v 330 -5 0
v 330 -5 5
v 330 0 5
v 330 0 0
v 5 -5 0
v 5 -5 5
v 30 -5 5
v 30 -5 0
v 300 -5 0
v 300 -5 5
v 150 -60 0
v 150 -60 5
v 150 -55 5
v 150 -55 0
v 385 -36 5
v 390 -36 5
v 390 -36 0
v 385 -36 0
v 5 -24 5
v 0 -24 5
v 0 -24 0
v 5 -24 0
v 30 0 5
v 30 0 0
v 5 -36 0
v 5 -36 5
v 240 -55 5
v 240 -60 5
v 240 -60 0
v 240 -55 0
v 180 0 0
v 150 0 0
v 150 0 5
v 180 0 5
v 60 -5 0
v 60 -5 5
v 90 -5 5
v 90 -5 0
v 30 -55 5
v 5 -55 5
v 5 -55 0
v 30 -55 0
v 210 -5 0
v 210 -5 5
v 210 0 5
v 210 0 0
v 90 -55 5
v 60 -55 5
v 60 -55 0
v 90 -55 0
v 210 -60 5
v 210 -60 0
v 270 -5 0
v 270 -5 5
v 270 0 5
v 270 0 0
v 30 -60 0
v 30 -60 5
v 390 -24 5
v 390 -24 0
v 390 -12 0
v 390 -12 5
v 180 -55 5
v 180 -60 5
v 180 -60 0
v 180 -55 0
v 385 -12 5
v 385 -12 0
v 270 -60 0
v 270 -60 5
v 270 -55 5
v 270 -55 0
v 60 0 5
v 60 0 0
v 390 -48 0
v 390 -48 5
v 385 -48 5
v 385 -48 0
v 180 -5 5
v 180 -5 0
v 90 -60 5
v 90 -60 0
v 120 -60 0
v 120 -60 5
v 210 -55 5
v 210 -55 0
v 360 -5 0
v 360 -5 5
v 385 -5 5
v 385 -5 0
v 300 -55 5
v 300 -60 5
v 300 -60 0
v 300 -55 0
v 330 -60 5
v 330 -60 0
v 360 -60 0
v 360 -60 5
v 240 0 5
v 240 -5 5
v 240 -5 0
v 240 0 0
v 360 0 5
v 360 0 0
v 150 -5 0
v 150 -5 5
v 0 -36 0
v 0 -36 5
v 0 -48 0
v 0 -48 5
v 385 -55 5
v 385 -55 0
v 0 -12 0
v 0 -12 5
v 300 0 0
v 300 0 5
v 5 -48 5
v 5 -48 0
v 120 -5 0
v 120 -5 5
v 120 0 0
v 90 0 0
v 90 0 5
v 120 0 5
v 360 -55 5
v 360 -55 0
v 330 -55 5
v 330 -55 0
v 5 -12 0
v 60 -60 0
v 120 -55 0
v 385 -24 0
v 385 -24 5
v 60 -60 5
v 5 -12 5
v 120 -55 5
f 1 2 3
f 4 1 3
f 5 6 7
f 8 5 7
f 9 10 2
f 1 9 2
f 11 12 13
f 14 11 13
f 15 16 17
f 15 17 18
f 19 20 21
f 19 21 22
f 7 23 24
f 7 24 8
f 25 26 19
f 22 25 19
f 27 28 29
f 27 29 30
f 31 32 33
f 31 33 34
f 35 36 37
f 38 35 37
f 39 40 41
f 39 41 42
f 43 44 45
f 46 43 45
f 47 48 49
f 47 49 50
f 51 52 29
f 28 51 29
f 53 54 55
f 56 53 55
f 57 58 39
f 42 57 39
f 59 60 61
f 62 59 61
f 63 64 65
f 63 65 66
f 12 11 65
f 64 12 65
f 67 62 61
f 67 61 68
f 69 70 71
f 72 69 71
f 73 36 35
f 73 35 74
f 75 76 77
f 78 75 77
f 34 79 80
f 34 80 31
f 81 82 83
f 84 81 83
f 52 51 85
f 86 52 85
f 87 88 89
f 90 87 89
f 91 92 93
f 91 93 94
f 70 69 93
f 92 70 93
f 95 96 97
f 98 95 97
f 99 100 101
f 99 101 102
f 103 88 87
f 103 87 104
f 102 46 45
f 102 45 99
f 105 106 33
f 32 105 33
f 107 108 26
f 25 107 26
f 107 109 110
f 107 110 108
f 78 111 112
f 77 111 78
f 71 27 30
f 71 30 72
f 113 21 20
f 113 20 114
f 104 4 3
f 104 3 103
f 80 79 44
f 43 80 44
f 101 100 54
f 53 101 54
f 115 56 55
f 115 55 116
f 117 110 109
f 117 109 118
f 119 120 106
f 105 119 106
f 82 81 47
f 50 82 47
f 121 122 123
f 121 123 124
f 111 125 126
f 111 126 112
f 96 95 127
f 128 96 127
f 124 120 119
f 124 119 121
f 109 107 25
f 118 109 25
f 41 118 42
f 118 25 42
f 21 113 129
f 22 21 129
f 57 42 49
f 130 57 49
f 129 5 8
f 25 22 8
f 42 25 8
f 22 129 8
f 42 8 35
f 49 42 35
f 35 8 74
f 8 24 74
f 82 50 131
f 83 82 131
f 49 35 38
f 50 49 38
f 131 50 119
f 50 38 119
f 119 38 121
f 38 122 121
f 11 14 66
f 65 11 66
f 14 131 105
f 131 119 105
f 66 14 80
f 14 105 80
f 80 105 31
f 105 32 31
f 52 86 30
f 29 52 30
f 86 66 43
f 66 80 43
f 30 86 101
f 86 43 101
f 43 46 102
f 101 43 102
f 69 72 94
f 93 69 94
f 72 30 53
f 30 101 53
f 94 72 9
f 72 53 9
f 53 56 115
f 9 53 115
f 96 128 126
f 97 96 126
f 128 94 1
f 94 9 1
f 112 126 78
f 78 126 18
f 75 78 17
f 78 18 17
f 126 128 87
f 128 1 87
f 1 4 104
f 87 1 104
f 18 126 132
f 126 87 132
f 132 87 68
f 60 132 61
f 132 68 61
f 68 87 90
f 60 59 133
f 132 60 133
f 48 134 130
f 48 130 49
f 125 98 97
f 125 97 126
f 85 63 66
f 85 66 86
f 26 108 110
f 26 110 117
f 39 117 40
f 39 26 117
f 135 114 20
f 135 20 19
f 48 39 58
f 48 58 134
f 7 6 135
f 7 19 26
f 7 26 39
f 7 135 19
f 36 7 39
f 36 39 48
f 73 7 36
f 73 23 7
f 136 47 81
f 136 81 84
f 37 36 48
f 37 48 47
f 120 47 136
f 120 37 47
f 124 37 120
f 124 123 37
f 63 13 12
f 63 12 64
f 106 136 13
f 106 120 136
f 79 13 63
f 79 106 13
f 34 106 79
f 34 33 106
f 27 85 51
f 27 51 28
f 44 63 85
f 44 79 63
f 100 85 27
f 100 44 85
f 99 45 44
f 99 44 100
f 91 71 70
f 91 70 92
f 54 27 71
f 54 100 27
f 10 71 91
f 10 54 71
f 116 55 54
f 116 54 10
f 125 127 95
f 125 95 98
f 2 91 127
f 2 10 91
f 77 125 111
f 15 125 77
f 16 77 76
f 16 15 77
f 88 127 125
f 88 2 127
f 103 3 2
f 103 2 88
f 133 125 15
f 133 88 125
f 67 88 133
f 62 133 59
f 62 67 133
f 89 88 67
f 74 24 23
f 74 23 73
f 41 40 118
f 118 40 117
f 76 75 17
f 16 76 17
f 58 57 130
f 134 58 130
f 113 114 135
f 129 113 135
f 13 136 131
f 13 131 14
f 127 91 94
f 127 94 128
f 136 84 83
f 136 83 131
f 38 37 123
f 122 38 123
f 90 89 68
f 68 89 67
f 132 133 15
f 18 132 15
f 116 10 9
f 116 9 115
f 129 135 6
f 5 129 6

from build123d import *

# Parameters (mm, degrees)
ESQUISSE1_W                = 390
ESQUISSE1_H                = 60
BOSS_EXTRU_1_DEPTH         = 5
ESQUISSE2_W                = 30
ESQUISSE2_H                = 5
ENL_V_MAT_EXTRU_1_DEPTH    = 5
R_P_TITION_LIN_AIRE1_COUNT = 7
R_P_TITION_LIN_AIRE1_PITCH = 60
ESQUISSE3_W                = 5
ESQUISSE3_H                = 12
ENL_V_MAT_EXTRU_2_DEPTH    = 5
R_P_TITION_LIN_AIRE2_COUNT = 3
R_P_TITION_LIN_AIRE2_PITCH = 24
SYM_TRIE1_COPY_1_SKETCH_W  = 5
SYM_TRIE1_COPY_1_SKETCH_H  = 12
SYM_TRIE1_COPY_1_DEPTH     = 5
SYM_TRIE1_COPY_2_SKETCH_W  = 5
SYM_TRIE1_COPY_2_SKETCH_H  = 12
SYM_TRIE1_COPY_2_DEPTH     = 5
SYM_TRIE2_COPY_1_SKETCH_W  = 30
SYM_TRIE2_COPY_1_SKETCH_H  = 5
SYM_TRIE2_COPY_1_DEPTH     = 5
SYM_TRIE2_COPY_2_SKETCH_W  = 30
SYM_TRIE2_COPY_2_SKETCH_H  = 5
SYM_TRIE2_COPY_2_DEPTH     = 5
SYM_TRIE2_COPY_3_SKETCH_W  = 30
SYM_TRIE2_COPY_3_SKETCH_H  = 5
SYM_TRIE2_COPY_3_DEPTH     = 5
SYM_TRIE2_COPY_4_SKETCH_W  = 30
SYM_TRIE2_COPY_4_SKETCH_H  = 5
SYM_TRIE2_COPY_4_DEPTH     = 5
SYM_TRIE2_COPY_5_SKETCH_W  = 30
SYM_TRIE2_COPY_5_SKETCH_H  = 5
SYM_TRIE2_COPY_5_DEPTH     = 5
SYM_TRIE2_COPY_6_SKETCH_W  = 30
SYM_TRIE2_COPY_6_SKETCH_H  = 5
SYM_TRIE2_COPY_6_DEPTH     = 5


with BuildPart() as part:
    # Esquisse1 → Boss.-Extru.1 (new body)
    with BuildSketch(Plane.XY):
        with Locations((195, -30)):
            Rectangle(ESQUISSE1_W, ESQUISSE1_H)
    extrude(amount=BOSS_EXTRU_1_DEPTH)

    # Esquisse2 → Enlèv. mat.-Extru.1 (cut)
    with BuildSketch(Plane.XY.offset(5)):
        with Locations((15, -57.5)):
            Rectangle(ESQUISSE2_W, ESQUISSE2_H)
    enl_v_mat_extru_1 = extrude(amount=-ENL_V_MAT_EXTRU_1_DEPTH, mode=Mode.SUBTRACT)

    # Répétition linéaire1: Enlèv. mat.-Extru.1 ×7
    with Locations(*[(i * R_P_TITION_LIN_AIRE1_PITCH, 0, 0) for i in range(1, R_P_TITION_LIN_AIRE1_COUNT)]):
        add(enl_v_mat_extru_1, mode=Mode.SUBTRACT)

    # Esquisse3 → Enlèv. mat.-Extru.2 (cut)
    with BuildSketch(Plane.XY.offset(5)):
        with Locations((2.5, -54)):
            Rectangle(ESQUISSE3_W, ESQUISSE3_H)
    enl_v_mat_extru_2 = extrude(amount=-ENL_V_MAT_EXTRU_2_DEPTH, mode=Mode.SUBTRACT)

    # Répétition linéaire2: Enlèv. mat.-Extru.2 ×3
    with Locations(*[(0, i * R_P_TITION_LIN_AIRE2_PITCH, 0) for i in range(1, R_P_TITION_LIN_AIRE2_COUNT)]):
        add(enl_v_mat_extru_2, mode=Mode.SUBTRACT)

    # Symétrie1: Enlèv. mat.-Extru.2 across plane
    add(enl_v_mat_extru_2.mirror(Plane.ZY.offset(-195)), mode=Mode.SUBTRACT)

    # Symétrie1 copy 1 sketch → Symétrie1 copy 1 (cut)
    with BuildSketch(Plane(origin=(390, 24, 5), x_dir=(-1, 0, 0), z_dir=(0, 0, 1))):
        with Locations((2.5, 54)):
            Rectangle(SYM_TRIE1_COPY_1_SKETCH_W, SYM_TRIE1_COPY_1_SKETCH_H)
    extrude(amount=-SYM_TRIE1_COPY_1_DEPTH, mode=Mode.SUBTRACT)

    # Symétrie1 copy 2 sketch → Symétrie1 copy 2 (cut)
    with BuildSketch(Plane(origin=(390, 48, 5), x_dir=(-1, 0, 0), z_dir=(0, 0, 1))):
        with Locations((2.5, 54)):
            Rectangle(SYM_TRIE1_COPY_2_SKETCH_W, SYM_TRIE1_COPY_2_SKETCH_H)
    extrude(amount=-SYM_TRIE1_COPY_2_DEPTH, mode=Mode.SUBTRACT)

    # Symétrie2: Enlèv. mat.-Extru.1 across plane
    add(enl_v_mat_extru_1.mirror(Plane(origin=(0, -30, 0), x_dir=(0, 0, 1), z_dir=(0, -1, 0))), mode=Mode.SUBTRACT)

    # Symétrie2 copy 1 sketch → Symétrie2 copy 1 (cut)
    with BuildSketch(Plane(origin=(60, -60, 5), x_dir=(1, 0, 0), z_dir=(0, 0, 1))):
        with Locations((15, 57.5)):
            Rectangle(SYM_TRIE2_COPY_1_SKETCH_W, SYM_TRIE2_COPY_1_SKETCH_H)
    extrude(amount=-SYM_TRIE2_COPY_1_DEPTH, mode=Mode.SUBTRACT)

    # Symétrie2 copy 2 sketch → Symétrie2 copy 2 (cut)
    with BuildSketch(Plane(origin=(120, -60, 5), x_dir=(1, 0, 0), z_dir=(0, 0, 1))):
        with Locations((15, 57.5)):
            Rectangle(SYM_TRIE2_COPY_2_SKETCH_W, SYM_TRIE2_COPY_2_SKETCH_H)
    extrude(amount=-SYM_TRIE2_COPY_2_DEPTH, mode=Mode.SUBTRACT)

    # Symétrie2 copy 3 sketch → Symétrie2 copy 3 (cut)
    with BuildSketch(Plane(origin=(180, -60, 5), x_dir=(1, 0, 0), z_dir=(0, 0, 1))):
        with Locations((15, 57.5)):
            Rectangle(SYM_TRIE2_COPY_3_SKETCH_W, SYM_TRIE2_COPY_3_SKETCH_H)
    extrude(amount=-SYM_TRIE2_COPY_3_DEPTH, mode=Mode.SUBTRACT)

    # Symétrie2 copy 4 sketch → Symétrie2 copy 4 (cut)
    with BuildSketch(Plane(origin=(240, -60, 5), x_dir=(1, 0, 0), z_dir=(0, 0, 1))):
        with Locations((15, 57.5)):
            Rectangle(SYM_TRIE2_COPY_4_SKETCH_W, SYM_TRIE2_COPY_4_SKETCH_H)
    extrude(amount=-SYM_TRIE2_COPY_4_DEPTH, mode=Mode.SUBTRACT)

    # Symétrie2 copy 5 sketch → Symétrie2 copy 5 (cut)
    with BuildSketch(Plane(origin=(300, -60, 5), x_dir=(1, 0, 0), z_dir=(0, 0, 1))):
        with Locations((15, 57.5)):
            Rectangle(SYM_TRIE2_COPY_5_SKETCH_W, SYM_TRIE2_COPY_5_SKETCH_H)
    extrude(amount=-SYM_TRIE2_COPY_5_DEPTH, mode=Mode.SUBTRACT)

    # Symétrie2 copy 6 sketch → Symétrie2 copy 6 (cut)
    with BuildSketch(Plane(origin=(360, -60, 5), x_dir=(1, 0, 0), z_dir=(0, 0, 1))):
        with Locations((15, 57.5)):
            Rectangle(SYM_TRIE2_COPY_6_SKETCH_W, SYM_TRIE2_COPY_6_SKETCH_H)
    extrude(amount=-SYM_TRIE2_COPY_6_DEPTH, mode=Mode.SUBTRACT)


solid = part.part
